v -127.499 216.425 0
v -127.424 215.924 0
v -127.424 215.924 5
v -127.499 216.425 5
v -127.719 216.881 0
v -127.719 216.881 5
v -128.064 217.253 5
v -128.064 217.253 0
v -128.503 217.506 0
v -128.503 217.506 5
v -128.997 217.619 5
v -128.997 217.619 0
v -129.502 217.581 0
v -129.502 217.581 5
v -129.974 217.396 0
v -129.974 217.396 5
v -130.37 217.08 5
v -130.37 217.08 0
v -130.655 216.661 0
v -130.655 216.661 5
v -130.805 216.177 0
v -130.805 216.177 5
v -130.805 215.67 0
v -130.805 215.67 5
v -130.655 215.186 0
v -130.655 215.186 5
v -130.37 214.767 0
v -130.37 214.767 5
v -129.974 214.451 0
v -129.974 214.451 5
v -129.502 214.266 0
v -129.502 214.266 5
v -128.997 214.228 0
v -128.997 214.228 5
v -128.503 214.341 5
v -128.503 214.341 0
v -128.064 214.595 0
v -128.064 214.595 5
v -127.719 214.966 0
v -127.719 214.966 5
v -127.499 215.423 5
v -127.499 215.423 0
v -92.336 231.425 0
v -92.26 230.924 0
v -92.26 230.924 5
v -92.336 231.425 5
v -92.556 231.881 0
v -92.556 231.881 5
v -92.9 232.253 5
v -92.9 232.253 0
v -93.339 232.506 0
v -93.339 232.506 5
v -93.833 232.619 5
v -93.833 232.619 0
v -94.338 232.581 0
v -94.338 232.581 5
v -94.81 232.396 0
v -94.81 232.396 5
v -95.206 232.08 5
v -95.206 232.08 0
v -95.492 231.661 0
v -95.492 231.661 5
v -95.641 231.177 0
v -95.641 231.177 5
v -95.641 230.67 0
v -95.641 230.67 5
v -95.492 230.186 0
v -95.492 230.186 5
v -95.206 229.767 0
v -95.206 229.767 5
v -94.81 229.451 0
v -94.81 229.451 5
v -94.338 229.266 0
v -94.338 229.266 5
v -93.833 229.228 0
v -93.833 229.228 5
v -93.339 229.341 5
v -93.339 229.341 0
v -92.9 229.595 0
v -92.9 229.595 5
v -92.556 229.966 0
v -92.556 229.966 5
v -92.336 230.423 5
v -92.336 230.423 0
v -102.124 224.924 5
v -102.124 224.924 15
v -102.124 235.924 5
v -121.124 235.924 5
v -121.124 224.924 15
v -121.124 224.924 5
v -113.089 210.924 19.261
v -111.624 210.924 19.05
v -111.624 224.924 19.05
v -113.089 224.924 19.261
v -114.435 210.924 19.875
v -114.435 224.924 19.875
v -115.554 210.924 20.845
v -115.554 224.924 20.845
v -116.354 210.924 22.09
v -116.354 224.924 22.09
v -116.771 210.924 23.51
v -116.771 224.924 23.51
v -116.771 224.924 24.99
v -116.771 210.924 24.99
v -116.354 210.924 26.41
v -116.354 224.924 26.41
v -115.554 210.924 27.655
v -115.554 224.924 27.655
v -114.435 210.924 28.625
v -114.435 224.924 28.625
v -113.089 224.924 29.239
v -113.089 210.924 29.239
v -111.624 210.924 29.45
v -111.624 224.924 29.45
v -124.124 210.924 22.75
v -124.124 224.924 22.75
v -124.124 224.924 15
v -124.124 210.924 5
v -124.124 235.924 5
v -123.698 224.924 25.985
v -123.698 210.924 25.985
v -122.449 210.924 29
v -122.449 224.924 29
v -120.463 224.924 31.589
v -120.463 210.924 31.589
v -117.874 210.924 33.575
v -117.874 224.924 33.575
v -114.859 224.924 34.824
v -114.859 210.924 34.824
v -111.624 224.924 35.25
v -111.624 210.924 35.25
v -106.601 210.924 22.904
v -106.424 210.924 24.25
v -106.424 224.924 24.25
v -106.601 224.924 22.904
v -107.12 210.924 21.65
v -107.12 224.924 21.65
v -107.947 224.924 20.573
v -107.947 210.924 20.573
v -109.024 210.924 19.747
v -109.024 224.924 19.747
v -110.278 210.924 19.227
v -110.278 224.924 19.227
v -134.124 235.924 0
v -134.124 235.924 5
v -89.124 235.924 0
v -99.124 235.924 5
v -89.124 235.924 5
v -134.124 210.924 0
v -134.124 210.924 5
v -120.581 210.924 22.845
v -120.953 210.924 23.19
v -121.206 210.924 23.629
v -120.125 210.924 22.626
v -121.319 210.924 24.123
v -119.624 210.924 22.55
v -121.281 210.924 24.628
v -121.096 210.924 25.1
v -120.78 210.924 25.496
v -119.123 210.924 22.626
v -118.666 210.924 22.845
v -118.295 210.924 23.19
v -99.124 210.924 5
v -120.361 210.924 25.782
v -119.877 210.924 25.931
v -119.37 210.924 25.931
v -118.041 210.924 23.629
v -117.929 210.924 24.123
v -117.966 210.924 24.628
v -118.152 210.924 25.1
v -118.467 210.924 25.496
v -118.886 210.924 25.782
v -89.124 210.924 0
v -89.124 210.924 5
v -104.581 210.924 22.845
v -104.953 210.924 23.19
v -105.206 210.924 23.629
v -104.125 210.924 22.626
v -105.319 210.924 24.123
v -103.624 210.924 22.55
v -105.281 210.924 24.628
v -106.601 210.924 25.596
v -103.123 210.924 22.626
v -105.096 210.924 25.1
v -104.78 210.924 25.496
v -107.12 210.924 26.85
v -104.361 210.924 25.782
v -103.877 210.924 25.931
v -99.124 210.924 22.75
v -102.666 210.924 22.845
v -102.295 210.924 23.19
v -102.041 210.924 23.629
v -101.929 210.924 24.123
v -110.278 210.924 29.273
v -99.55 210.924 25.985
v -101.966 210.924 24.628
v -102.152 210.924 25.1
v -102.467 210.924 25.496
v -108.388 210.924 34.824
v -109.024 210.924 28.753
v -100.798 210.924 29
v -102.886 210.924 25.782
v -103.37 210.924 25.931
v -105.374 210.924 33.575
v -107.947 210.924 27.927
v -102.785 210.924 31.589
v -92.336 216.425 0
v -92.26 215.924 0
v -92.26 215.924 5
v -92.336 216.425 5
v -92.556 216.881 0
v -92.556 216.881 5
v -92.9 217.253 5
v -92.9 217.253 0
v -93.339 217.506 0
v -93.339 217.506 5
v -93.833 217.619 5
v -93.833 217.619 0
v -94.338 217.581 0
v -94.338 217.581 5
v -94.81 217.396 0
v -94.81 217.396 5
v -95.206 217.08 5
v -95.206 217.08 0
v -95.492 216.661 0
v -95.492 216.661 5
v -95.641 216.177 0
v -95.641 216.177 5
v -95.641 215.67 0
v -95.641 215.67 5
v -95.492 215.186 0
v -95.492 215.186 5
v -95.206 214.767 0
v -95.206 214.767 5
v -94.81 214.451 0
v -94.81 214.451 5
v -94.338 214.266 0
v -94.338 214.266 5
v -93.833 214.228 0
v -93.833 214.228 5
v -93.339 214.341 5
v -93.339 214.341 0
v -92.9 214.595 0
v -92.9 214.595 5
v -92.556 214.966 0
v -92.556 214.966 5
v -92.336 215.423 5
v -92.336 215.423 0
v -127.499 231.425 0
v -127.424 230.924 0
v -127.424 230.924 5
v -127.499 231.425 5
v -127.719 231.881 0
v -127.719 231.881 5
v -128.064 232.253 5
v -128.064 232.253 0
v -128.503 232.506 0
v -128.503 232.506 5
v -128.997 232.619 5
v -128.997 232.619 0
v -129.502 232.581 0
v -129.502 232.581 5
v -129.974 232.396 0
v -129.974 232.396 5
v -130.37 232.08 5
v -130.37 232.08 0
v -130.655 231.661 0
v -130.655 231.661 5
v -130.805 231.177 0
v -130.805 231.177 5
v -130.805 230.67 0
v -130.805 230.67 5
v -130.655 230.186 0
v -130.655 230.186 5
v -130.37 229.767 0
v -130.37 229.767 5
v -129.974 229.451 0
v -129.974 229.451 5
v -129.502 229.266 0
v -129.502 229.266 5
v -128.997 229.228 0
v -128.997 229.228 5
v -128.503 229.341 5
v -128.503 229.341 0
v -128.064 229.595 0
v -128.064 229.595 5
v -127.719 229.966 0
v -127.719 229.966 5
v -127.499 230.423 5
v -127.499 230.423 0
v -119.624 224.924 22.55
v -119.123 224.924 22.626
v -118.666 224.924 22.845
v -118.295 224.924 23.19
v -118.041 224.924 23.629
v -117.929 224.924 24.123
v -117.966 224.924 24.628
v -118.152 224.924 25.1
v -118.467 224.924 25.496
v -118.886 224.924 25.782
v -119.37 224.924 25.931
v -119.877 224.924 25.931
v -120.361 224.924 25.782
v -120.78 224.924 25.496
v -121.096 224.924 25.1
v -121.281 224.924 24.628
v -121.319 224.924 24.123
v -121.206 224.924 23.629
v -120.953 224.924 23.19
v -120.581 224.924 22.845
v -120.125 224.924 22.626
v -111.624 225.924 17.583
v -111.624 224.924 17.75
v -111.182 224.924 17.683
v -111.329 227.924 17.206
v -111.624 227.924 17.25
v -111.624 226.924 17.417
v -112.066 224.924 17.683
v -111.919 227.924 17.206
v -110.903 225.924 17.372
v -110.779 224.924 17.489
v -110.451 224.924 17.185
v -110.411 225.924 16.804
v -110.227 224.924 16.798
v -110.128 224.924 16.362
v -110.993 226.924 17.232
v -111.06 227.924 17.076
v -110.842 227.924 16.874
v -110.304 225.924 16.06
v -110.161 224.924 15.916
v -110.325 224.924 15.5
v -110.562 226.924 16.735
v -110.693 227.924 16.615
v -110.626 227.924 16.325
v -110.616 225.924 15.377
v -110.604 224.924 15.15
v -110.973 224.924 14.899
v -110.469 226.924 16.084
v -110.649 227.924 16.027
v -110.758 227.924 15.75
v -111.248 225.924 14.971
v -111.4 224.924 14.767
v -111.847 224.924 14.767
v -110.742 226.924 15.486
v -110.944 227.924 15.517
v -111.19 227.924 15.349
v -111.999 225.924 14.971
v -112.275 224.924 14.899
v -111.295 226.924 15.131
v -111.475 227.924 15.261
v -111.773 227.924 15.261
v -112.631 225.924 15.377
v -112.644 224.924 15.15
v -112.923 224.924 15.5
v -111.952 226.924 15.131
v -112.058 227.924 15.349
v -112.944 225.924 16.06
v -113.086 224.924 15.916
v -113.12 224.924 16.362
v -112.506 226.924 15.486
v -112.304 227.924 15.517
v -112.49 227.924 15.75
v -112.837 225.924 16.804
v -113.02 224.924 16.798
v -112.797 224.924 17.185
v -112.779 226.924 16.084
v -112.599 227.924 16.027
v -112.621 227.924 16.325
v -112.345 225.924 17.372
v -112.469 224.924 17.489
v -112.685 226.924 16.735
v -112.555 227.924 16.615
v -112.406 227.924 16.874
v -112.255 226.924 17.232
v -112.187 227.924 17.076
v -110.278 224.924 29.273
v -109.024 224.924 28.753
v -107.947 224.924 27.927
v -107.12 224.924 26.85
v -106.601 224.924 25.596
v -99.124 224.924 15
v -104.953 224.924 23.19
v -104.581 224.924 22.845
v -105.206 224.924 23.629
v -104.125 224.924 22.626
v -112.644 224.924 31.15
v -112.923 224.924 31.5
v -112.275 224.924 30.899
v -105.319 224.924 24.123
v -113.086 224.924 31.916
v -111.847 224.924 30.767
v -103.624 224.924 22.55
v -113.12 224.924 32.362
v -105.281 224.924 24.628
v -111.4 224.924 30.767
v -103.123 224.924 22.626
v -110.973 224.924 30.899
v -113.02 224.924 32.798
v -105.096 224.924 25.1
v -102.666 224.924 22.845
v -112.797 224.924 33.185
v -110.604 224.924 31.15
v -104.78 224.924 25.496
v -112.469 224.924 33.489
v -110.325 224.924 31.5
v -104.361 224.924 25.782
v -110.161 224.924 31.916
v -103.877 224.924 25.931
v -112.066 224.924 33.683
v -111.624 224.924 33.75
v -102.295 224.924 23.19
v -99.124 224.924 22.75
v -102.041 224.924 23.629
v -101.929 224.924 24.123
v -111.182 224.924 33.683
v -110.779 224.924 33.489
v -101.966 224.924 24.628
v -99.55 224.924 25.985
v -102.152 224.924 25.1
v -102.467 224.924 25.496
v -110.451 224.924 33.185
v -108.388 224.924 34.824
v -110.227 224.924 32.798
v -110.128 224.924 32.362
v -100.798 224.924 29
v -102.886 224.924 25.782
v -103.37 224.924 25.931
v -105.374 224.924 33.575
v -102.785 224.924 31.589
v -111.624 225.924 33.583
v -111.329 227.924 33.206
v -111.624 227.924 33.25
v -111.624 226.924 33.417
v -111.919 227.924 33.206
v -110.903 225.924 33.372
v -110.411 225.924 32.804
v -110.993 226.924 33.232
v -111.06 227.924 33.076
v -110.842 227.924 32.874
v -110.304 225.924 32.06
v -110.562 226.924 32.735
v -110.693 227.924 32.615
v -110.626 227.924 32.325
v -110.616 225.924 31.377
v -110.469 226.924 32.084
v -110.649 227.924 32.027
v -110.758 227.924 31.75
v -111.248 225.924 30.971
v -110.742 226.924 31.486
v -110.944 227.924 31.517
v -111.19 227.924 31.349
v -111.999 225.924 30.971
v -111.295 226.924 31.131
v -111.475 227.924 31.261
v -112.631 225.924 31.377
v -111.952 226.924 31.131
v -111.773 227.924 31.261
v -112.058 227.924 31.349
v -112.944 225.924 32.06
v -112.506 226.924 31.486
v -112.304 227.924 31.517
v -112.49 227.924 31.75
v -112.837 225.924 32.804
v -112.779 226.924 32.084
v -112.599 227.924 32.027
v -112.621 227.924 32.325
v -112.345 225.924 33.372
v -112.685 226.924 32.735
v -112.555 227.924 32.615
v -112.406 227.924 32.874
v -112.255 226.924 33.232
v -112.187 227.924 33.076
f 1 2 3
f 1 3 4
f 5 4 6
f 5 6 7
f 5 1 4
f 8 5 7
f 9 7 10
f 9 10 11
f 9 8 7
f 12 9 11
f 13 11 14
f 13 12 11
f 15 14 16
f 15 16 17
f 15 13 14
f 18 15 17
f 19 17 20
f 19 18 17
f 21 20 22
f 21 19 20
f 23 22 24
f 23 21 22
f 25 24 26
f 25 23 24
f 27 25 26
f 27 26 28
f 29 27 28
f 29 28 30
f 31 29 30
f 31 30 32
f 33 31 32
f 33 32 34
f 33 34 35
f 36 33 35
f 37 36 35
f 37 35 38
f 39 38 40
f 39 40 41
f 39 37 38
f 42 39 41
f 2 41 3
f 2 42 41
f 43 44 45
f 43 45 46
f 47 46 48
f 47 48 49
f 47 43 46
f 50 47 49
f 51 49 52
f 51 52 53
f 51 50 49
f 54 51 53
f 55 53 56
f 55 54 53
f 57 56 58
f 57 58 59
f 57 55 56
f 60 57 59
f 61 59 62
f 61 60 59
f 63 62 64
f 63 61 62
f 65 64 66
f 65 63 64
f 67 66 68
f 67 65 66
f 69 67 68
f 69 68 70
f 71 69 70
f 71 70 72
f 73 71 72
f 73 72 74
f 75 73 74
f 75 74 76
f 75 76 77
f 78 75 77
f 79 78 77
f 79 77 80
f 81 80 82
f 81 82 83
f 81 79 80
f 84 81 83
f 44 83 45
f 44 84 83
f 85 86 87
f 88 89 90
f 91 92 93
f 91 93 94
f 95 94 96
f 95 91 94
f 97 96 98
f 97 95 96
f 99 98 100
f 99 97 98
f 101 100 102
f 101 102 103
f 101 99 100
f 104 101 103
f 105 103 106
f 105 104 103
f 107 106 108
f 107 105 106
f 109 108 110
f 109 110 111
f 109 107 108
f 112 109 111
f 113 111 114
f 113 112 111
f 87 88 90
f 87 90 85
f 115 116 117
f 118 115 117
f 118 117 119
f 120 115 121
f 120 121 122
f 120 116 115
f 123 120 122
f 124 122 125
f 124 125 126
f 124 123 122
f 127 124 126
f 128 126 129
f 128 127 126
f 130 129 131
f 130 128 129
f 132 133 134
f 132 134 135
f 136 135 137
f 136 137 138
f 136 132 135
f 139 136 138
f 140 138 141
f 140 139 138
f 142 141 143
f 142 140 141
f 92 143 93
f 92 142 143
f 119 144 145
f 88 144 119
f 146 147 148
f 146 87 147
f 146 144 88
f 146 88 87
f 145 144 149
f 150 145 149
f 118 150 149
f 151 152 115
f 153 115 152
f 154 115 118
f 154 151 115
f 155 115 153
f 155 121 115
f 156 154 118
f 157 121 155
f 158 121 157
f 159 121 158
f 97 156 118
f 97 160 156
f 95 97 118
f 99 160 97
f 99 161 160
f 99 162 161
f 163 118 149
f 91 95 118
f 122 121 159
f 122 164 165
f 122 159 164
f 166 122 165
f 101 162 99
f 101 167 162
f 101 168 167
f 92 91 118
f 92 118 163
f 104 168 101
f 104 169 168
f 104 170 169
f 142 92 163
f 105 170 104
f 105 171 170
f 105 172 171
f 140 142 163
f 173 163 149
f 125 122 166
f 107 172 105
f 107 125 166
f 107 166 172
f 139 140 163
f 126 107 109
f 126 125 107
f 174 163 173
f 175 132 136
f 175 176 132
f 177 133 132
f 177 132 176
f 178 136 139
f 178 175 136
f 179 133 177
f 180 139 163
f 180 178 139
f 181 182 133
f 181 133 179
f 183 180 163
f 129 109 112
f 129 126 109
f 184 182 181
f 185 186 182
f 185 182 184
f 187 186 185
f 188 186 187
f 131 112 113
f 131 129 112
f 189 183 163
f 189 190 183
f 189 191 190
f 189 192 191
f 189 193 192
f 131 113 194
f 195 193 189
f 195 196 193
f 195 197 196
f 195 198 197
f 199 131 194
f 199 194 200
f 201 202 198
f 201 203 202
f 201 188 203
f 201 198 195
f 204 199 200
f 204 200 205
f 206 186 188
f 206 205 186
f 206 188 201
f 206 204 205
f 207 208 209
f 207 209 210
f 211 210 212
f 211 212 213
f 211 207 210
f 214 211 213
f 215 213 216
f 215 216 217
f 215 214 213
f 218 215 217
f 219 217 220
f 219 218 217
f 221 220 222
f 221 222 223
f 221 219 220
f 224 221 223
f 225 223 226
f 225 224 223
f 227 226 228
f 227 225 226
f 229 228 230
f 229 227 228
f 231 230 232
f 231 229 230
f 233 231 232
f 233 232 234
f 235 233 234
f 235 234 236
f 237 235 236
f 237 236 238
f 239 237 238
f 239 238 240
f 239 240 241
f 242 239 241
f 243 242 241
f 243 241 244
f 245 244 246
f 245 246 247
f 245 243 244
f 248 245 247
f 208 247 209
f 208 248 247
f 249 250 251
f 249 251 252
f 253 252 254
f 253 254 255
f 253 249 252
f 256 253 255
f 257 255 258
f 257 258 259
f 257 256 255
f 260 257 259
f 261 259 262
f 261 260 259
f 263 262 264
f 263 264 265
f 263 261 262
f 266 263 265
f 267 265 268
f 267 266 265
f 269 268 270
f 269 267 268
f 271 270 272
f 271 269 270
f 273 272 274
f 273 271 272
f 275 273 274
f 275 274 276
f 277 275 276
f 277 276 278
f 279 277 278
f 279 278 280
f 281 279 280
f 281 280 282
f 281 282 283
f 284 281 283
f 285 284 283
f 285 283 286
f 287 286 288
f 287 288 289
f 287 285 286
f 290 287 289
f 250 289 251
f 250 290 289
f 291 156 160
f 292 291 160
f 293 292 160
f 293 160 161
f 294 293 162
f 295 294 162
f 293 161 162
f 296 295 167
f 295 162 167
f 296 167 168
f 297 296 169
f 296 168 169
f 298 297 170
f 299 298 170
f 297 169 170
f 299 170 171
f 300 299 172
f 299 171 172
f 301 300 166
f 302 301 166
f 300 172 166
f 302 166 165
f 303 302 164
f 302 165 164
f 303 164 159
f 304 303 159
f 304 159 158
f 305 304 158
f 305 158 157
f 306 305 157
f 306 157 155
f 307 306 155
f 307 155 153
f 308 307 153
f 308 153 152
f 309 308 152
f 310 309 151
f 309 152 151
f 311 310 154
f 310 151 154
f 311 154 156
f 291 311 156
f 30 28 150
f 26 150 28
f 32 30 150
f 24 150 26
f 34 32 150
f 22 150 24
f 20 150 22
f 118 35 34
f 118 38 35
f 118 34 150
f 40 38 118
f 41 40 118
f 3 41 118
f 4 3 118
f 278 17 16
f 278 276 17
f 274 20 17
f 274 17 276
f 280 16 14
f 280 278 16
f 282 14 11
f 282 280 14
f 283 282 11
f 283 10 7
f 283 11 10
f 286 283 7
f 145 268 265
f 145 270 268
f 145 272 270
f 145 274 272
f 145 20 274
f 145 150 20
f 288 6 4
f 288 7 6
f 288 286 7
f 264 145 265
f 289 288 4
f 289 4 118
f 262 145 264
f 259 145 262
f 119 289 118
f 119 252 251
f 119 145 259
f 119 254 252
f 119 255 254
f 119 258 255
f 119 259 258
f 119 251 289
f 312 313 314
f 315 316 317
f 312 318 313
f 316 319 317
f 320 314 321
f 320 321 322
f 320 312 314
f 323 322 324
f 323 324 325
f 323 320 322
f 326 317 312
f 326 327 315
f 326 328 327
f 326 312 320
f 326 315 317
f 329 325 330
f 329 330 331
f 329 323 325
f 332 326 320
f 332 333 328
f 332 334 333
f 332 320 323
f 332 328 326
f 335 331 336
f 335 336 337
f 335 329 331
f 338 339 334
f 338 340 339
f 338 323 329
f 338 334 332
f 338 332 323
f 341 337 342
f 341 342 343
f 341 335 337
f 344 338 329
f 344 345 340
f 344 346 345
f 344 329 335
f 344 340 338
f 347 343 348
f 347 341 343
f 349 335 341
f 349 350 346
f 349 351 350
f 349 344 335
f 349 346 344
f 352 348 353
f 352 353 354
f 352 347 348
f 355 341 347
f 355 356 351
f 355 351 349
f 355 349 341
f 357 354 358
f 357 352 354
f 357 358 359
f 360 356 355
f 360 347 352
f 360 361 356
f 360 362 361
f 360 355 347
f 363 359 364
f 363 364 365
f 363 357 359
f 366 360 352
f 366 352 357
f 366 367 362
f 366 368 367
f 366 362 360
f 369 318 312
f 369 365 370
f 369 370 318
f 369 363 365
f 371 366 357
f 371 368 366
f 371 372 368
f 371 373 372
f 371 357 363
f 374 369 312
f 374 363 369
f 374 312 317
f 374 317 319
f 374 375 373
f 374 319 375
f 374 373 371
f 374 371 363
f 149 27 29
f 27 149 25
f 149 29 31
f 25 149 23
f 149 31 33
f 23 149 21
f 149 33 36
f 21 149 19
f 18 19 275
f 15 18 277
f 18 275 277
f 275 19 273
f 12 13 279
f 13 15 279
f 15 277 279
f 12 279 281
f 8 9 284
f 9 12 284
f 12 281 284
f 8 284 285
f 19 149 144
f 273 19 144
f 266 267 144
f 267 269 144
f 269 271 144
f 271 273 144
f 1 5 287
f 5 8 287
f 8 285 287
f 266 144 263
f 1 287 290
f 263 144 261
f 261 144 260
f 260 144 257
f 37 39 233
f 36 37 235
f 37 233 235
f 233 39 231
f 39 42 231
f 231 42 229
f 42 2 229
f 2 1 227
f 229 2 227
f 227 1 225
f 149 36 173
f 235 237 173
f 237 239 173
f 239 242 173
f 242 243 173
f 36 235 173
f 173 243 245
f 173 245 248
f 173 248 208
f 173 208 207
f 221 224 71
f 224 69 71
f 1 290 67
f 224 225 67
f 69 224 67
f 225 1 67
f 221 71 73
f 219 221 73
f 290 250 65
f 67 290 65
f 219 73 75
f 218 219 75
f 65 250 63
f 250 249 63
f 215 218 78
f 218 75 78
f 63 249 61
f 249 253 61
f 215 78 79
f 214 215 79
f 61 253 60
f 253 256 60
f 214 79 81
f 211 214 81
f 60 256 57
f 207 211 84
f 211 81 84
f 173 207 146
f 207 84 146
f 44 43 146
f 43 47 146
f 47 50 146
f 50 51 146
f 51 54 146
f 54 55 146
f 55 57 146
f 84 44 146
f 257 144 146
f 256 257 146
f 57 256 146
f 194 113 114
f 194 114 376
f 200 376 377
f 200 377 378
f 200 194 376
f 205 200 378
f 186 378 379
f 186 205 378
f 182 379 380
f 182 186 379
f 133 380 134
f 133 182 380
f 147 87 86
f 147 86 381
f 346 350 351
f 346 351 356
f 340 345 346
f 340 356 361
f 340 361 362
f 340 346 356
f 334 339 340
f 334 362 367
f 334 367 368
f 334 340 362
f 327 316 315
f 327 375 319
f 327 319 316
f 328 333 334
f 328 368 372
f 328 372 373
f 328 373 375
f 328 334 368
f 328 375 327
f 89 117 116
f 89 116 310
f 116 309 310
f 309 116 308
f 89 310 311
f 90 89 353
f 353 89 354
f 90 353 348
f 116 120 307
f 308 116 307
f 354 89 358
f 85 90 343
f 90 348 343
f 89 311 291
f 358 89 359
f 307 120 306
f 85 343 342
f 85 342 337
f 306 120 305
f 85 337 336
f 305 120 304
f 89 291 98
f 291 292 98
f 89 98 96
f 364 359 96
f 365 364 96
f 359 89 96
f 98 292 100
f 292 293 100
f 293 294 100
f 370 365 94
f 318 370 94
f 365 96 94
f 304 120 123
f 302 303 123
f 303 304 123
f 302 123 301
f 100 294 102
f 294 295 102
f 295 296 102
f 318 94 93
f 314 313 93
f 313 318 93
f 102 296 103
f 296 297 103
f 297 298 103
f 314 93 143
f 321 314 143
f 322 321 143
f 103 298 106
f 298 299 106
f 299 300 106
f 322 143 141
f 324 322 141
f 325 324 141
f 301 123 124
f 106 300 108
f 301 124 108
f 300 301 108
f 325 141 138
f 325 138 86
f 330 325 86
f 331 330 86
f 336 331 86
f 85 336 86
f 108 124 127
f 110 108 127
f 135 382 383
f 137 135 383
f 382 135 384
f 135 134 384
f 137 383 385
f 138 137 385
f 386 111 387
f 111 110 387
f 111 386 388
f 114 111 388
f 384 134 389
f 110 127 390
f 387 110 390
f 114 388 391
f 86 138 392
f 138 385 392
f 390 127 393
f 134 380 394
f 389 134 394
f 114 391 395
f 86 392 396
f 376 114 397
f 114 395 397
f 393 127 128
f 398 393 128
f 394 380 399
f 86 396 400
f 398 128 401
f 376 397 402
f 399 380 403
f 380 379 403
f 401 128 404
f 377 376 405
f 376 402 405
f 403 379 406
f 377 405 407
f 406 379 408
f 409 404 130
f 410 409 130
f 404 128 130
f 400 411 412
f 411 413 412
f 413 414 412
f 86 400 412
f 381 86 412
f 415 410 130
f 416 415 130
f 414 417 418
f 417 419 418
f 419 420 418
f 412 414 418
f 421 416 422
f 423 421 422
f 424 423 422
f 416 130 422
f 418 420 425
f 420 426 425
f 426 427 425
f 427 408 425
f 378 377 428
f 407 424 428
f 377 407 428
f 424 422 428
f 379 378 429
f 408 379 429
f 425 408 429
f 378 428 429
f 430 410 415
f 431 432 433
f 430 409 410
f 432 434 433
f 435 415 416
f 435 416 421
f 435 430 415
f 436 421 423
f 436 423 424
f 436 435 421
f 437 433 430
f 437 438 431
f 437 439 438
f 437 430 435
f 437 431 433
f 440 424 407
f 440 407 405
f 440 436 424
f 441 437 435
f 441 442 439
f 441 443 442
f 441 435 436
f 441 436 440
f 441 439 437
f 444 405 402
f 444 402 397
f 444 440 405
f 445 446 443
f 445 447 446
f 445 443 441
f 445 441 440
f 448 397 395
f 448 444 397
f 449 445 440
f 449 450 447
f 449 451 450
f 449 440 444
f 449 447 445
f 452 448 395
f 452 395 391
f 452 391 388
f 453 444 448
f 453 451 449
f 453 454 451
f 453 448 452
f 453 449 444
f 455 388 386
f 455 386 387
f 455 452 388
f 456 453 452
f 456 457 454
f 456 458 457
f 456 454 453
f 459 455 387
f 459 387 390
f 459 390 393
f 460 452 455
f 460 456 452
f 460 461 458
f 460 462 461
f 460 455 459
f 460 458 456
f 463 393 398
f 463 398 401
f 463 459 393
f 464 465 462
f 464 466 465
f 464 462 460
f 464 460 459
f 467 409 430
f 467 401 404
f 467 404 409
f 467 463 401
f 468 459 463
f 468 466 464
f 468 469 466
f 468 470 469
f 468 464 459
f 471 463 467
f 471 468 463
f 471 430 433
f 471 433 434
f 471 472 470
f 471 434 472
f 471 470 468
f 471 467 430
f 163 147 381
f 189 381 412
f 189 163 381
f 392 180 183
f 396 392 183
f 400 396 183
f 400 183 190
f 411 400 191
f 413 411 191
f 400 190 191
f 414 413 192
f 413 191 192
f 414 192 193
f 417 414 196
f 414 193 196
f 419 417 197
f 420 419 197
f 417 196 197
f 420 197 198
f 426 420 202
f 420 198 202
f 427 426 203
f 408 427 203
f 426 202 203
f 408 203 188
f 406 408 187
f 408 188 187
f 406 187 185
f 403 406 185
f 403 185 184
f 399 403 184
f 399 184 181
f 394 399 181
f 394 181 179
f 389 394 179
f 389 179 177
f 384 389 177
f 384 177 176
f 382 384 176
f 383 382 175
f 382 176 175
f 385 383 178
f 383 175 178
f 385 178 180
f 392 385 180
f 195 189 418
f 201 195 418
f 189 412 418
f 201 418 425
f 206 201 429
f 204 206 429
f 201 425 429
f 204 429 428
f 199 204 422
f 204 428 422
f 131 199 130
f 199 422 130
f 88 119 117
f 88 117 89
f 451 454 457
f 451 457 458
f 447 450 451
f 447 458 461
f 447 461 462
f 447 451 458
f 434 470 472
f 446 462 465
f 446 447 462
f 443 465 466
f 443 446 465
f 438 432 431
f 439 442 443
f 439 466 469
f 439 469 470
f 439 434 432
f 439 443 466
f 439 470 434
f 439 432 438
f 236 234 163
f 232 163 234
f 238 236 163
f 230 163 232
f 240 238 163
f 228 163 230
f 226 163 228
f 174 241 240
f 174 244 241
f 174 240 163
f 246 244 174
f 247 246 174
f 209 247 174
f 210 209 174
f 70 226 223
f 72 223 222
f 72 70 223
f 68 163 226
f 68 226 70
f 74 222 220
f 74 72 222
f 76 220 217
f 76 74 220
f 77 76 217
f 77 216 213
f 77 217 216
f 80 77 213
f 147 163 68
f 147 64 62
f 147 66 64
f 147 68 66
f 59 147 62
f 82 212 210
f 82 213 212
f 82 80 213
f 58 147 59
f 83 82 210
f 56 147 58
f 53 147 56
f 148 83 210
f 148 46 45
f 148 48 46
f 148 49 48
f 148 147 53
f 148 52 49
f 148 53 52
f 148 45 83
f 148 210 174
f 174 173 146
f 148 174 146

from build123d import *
from OCP.BRepFilletAPI import BRepFilletAPI_MakeChamfer

# Parameters (mm, degrees)
SKETCH1_R           = 1.7
BOSS_EXTRUDE1_DEPTH = 5
SKETCH2_R           = 1.7
BOSS_EXTRUDE2_DEPTH = 14
SKETCH3_R           = 1.5
BOSS_EXTRUDE3_DEPTH = 3
CHAMFER1_SIZE       = 3
CHAMFER1_SIZE_2     = 0.5
FILLET1_R           = 12.5
SKETCH4_W           = 3
SKETCH4_H           = 10
BOSS_EXTRUDE4_DEPTH = 11
CHAMFER2_SIZE       = 10
CHAMFER2_SIZE_2     = 11


with BuildPart() as part:
    # Sketch1 → Boss-Extrude1 (new body)
    with BuildSketch(Plane.XY):
        Polygon((-93.960167873, 235.92362241), (-129.123766163, 235.92362241), (-134.123766163, 235.92362241), (-134.123766163, 210.92362241), (-129.123766163, 210.92362241), (-93.960167873, 210.92362241), (-89.123766163, 210.92362241), (-89.123766163, 235.92362241), align=None)
        with Locations((-93.960167873, 215.92362241)):
            Circle(SKETCH1_R, mode=Mode.SUBTRACT)
        with Locations((-93.960167873, 230.92362241)):
            Circle(SKETCH1_R, mode=Mode.SUBTRACT)
        with Locations((-129.123766163, 215.92362241)):
            Circle(SKETCH1_R, mode=Mode.SUBTRACT)
        with Locations((-129.123766163, 230.92362241)):
            Circle(SKETCH1_R, mode=Mode.SUBTRACT)
    extrude(amount=BOSS_EXTRUDE1_DEPTH)

    # Sketch2 → Boss-Extrude2 (add)
    # profile 1 of 2: a face of its own
    with BuildSketch(Plane.XZ.offset(-210.92362241)):
        with BuildLine():
            Line((-111.623766166, 19.049999998), (-111.623766166, 5))
            Line((-111.623766166, 5), (-99.123766166, 5))
            Line((-99.123766166, 5), (-99.123766166, 35.249999998))
            Line((-99.123766166, 35.249999998), (-111.623766166, 35.249999998))
            Line((-111.623766166, 35.249999998), (-111.623766166, 29.449999998))
            ThreePointArc((-111.623766166, 29.449999998), (-107.946810904, 27.92695526), (-106.423766166, 24.249999998))
            ThreePointArc((-106.423766166, 24.249999998), (-107.946810904, 20.573044736), (-111.623766166, 19.049999998))
        make_face()
        with Locations(Location((-103.623766166, 24.249999998, 0), (0, 0, 270))):
            Circle(SKETCH2_R, mode=Mode.SUBTRACT)
    # profile 2 of 2: a face of its own
    with BuildSketch(Plane.XZ.offset(-210.92362241)):
        with BuildLine():
            Line((-124.123766166, 5), (-111.623766166, 5))
            Line((-111.623766166, 5), (-111.623766166, 19.049999998))
            ThreePointArc((-111.623766166, 19.049999998), (-116.823766166, 24.249999998), (-111.623766166, 29.449999998))
            Line((-111.623766166, 29.449999998), (-111.623766166, 35.249999998))
            Line((-111.623766166, 35.249999998), (-124.123766166, 35.249999998))
            Line((-124.123766166, 35.249999998), (-124.123766166, 5))
        make_face()
        with Locations(Location((-119.623766166, 24.249999998, 0), (0, 0, 270))):
            Circle(SKETCH2_R, mode=Mode.SUBTRACT)
    extrude(amount=-BOSS_EXTRUDE2_DEPTH)

    # Sketch3 → Boss-Extrude3 (add)
    with BuildSketch(Plane(origin=(0, 224.92362241, 0), x_dir=(1, 0, 0), z_dir=(0, 1, 0))):
        with Locations(Location((-111.623766166, -16.249999998, 0), (0, 0, 270))):
            Circle(SKETCH3_R)
        with Locations(Location((-111.623766166, -32.249999998, 0), (0, 0, 270))):
            Circle(SKETCH3_R)
    extrude(amount=BOSS_EXTRUDE3_DEPTH)

    # Chamfer1
    chamfer1_edges_1 = [part.edges().sort_by_distance(p)[0] for p in [
        (-111.623766166, 227.92362241, 14.749999998),
    ]]
    chamfer1_side_1 = [part.faces().sort_by_distance(p)[0] for p in [
        (-111.623766166, 227.91362241, 14.749999998),
    ]]
    chamfer1_edges_2 = [part.edges().sort_by_distance(p)[0] for p in [
        (-111.623766166, 227.92362241, 30.749999998),
    ]]
    chamfer1_side_2 = [part.faces().sort_by_distance(p)[0] for p in [
        (-111.623766166, 227.91362241, 30.749999998),
    ]]
    chamfer1 = BRepFilletAPI_MakeChamfer(part.part.solid().wrapped)
    for e in chamfer1_edges_1:
        chamfer1.Add(CHAMFER1_SIZE - 0.0001, CHAMFER1_SIZE_2 - 0.0001, e.wrapped, chamfer1_side_1[0].wrapped)
    for e in chamfer1_edges_2:
        chamfer1.Add(CHAMFER1_SIZE - 0.0001, CHAMFER1_SIZE_2 - 0.0001, e.wrapped, chamfer1_side_2[0].wrapped)
    add(Compound.cast(chamfer1.Shape()), mode=Mode.REPLACE)  # a hair under: the kernel refuses the full size

    # Fillet1
    fillet1_edges = [part.edges().sort_by_distance(p)[0] for p in [
        (-99.123766166, 217.92362241, 35.249999998),
        (-124.123766166, 217.92362241, 35.249999998),
    ]]
    fillet(fillet1_edges, radius=FILLET1_R - 0.0001)  # a hair under: the kernel refuses the full size

    # Sketch4 → Boss-Extrude4 (add)
    with BuildSketch(Plane(origin=(0, 224.92362241, 0), x_dir=(1, 0, 0), z_dir=(0, 1, 0))):
        with Locations((-122.623766166, -10)):
            Rectangle(SKETCH4_W, SKETCH4_H)
        with Locations((-100.623766166, -10)):
            Rectangle(SKETCH4_W, SKETCH4_H)
    extrude(amount=BOSS_EXTRUDE4_DEPTH)

    # Chamfer2
    chamfer2_edges_1 = [part.edges().sort_by_distance(p)[0] for p in [
        (-100.623766166, 235.92362241, 15),
    ]]
    chamfer2_side_1 = [part.faces().sort_by_distance(p)[0] for p in [
        (-100.623766166, 235.92362241, 14.8),
    ]]
    chamfer2_edges_2 = [part.edges().sort_by_distance(p)[0] for p in [
        (-122.623766166, 235.92362241, 15),
    ]]
    chamfer2_side_2 = [part.faces().sort_by_distance(p)[0] for p in [
        (-122.623766166, 235.92362241, 14.8),
    ]]
    chamfer2 = BRepFilletAPI_MakeChamfer(part.part.solid().wrapped)
    for e in chamfer2_edges_1:
        chamfer2.Add(CHAMFER2_SIZE - 0.0001, CHAMFER2_SIZE_2 - 0.0001, e.wrapped, chamfer2_side_1[0].wrapped)
    for e in chamfer2_edges_2:
        chamfer2.Add(CHAMFER2_SIZE - 0.0001, CHAMFER2_SIZE_2 - 0.0001, e.wrapped, chamfer2_side_2[0].wrapped)
    add(Compound.cast(chamfer2.Shape()), mode=Mode.REPLACE)  # a hair under: the kernel refuses the full size


solid = part.part
